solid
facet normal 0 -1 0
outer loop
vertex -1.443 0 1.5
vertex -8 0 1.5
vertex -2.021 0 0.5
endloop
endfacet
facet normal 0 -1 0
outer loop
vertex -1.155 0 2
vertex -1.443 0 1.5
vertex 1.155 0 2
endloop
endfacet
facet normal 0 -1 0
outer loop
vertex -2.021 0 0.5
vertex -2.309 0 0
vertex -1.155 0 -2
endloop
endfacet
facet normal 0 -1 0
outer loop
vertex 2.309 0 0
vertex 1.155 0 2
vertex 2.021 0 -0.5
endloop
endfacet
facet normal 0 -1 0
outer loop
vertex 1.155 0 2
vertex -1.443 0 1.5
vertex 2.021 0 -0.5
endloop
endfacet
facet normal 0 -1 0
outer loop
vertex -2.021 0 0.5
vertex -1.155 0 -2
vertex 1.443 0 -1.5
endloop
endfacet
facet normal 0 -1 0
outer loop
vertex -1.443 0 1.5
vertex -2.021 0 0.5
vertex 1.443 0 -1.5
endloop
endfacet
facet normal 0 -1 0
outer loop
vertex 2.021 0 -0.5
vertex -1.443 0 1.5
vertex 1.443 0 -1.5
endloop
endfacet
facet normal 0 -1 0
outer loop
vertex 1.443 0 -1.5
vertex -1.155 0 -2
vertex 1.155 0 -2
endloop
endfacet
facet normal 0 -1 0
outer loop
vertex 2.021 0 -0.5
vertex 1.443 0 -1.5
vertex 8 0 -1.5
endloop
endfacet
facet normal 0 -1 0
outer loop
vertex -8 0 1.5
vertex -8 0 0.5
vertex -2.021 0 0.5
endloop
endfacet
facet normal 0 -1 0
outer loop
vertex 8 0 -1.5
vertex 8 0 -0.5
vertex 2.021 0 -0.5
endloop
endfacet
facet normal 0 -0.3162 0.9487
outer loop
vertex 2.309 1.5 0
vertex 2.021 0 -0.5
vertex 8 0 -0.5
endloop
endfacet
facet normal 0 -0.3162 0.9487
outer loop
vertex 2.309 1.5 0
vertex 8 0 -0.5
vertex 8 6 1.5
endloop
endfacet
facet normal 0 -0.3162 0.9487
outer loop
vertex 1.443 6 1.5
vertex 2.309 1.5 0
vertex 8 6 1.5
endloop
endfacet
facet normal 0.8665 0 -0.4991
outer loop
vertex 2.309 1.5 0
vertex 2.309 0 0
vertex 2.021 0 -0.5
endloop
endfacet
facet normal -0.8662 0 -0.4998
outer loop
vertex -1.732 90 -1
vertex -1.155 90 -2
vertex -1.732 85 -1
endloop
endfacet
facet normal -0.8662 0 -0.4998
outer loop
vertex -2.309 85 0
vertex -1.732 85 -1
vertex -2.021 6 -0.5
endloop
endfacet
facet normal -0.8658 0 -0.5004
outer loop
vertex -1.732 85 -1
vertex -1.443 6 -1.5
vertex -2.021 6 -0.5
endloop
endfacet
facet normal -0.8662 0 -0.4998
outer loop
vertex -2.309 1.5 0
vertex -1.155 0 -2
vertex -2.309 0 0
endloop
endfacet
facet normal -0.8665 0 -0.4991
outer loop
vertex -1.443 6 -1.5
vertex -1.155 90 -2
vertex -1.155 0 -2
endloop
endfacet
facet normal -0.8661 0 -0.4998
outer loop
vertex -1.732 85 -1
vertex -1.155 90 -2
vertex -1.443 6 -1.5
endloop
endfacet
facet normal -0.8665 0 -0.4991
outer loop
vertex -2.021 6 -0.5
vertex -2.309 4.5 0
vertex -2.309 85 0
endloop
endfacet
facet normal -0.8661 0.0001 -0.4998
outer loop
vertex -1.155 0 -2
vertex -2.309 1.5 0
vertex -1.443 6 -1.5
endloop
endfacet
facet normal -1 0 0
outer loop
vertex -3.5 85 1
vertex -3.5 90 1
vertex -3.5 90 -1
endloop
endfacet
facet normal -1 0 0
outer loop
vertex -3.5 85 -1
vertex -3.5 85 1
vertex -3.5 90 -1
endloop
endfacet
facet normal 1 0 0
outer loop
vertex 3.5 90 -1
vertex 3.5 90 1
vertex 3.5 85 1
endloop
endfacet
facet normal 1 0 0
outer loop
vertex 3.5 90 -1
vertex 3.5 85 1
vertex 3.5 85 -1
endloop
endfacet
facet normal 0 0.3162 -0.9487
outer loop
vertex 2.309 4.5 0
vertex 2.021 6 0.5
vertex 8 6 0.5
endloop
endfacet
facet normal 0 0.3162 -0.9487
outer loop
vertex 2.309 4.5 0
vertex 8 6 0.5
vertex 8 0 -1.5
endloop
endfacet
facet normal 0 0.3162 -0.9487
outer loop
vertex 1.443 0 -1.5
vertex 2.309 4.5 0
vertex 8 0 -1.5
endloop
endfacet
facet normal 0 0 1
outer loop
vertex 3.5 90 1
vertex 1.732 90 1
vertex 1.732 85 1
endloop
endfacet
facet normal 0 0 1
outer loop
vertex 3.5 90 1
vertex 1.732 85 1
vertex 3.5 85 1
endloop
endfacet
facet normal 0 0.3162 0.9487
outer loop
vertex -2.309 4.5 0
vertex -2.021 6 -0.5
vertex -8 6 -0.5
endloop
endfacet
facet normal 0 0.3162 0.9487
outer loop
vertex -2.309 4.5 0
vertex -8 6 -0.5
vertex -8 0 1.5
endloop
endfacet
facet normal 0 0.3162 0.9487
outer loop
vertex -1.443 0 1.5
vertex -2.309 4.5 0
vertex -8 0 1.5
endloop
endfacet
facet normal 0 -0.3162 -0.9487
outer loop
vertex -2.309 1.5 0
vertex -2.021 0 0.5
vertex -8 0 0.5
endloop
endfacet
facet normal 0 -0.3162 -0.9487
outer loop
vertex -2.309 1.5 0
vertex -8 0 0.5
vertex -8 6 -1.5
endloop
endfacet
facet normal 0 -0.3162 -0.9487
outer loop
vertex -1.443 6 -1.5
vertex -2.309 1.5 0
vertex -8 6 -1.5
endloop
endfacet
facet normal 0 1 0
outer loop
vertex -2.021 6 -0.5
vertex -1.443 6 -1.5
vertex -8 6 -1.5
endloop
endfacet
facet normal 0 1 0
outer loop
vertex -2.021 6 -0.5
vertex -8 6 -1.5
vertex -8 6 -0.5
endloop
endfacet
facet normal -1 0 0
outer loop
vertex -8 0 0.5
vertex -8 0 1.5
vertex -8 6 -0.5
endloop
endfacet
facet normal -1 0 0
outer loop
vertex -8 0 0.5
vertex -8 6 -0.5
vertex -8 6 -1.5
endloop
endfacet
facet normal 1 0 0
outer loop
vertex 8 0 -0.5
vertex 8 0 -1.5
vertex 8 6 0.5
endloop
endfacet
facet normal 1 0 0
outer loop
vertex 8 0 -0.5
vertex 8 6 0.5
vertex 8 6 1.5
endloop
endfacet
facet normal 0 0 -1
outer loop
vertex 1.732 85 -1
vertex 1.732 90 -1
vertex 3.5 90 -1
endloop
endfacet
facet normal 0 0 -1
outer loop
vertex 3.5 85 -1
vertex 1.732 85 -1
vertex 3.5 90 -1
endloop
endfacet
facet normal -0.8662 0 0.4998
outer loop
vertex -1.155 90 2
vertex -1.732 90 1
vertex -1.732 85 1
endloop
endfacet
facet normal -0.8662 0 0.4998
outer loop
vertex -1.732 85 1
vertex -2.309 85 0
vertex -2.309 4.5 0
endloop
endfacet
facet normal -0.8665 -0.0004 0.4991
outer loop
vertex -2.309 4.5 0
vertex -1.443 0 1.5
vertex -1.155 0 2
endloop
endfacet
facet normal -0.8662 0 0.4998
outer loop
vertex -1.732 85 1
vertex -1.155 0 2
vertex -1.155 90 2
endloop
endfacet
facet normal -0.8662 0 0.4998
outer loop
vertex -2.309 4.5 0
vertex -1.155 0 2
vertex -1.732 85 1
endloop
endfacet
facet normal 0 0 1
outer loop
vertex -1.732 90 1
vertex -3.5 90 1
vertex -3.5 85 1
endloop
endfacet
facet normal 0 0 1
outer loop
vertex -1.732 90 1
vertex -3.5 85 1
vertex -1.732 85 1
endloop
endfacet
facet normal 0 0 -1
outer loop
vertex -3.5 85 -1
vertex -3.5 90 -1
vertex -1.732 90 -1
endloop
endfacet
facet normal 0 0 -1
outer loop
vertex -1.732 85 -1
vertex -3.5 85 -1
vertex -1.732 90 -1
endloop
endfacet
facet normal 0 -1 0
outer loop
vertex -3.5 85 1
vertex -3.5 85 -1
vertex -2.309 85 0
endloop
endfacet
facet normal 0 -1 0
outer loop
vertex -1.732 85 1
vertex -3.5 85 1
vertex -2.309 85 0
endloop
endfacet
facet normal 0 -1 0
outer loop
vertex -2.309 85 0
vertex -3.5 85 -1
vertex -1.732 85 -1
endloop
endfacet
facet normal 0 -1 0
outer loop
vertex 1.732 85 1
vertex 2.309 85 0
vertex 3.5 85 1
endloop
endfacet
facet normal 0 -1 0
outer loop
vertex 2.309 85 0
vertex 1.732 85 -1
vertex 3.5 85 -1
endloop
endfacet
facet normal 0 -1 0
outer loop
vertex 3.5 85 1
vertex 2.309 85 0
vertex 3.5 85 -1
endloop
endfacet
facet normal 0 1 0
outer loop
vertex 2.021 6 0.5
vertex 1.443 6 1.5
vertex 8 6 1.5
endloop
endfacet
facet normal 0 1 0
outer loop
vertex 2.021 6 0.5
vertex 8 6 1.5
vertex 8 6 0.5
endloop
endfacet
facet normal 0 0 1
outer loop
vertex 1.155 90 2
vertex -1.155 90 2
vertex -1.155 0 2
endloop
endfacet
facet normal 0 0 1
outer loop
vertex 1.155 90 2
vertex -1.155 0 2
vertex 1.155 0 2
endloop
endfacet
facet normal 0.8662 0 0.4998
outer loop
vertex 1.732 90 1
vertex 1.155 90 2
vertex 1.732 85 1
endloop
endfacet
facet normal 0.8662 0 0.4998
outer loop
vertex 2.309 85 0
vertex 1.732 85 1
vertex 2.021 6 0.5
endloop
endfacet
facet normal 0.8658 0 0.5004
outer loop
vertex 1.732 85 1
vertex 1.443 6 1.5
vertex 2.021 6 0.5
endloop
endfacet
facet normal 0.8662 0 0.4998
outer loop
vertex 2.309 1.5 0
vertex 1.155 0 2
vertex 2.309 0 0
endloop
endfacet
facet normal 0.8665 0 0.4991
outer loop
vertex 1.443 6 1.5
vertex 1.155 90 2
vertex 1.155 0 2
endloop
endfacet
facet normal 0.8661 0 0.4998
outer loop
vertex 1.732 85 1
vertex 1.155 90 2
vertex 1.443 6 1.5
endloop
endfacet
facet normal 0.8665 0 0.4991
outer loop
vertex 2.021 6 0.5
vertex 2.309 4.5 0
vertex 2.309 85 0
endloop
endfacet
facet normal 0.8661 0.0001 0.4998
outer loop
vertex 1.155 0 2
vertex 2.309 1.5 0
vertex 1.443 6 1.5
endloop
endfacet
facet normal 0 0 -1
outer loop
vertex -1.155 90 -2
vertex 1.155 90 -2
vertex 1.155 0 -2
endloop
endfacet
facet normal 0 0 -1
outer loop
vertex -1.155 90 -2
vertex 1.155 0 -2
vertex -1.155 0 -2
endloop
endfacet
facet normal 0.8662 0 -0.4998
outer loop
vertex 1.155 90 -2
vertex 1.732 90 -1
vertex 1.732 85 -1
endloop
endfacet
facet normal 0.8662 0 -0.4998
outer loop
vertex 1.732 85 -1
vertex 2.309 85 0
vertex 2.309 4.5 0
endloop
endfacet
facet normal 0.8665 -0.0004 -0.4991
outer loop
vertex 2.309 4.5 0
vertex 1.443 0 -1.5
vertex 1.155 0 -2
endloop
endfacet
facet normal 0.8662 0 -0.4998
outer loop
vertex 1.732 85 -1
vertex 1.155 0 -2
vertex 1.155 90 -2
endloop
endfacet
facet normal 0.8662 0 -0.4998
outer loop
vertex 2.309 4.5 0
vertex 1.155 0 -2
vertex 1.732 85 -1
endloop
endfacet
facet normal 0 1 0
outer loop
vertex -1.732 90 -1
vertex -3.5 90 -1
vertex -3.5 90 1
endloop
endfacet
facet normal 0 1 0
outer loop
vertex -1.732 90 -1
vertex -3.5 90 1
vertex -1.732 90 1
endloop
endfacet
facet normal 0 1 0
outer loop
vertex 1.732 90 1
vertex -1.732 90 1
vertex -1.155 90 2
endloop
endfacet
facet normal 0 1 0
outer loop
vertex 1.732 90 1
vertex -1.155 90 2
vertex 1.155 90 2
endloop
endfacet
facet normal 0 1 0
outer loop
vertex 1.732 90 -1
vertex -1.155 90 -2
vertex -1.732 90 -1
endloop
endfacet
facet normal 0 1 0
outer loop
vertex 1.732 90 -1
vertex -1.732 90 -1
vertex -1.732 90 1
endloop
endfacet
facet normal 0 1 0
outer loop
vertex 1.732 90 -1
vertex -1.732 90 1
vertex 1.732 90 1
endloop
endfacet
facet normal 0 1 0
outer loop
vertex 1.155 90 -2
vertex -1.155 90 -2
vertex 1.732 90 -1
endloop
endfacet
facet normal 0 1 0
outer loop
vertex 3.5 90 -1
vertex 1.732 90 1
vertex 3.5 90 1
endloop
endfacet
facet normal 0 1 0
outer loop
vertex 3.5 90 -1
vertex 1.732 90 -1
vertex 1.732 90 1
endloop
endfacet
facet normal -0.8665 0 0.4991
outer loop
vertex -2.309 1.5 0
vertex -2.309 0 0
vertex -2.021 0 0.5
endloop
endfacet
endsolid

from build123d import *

# Parameters (mm, degrees)
BOSS_EXTRUDE1_DEPTH = 90
SKETCH2_W           = 7
SKETCH2_H           = 2
BOSS_EXTRUDE2_DEPTH = 5
BOSS_EXTRUDE3_DEPTH = 8
BOSS_EXTRUDE4_DEPTH = 8


with BuildPart() as part:
    # Sketch1 → Boss-Extrude1 (new body)
    with BuildSketch(Plane(origin=(0, 0, 0), x_dir=(1, 0, 0), z_dir=(0, 1, 0))):
        Polygon((-1.154700538, 2), (-2.309401077, 0), (-1.154700538, -2), (1.154700538, -2), (2.309401077, 0), (1.154700538, 2), align=None)
    extrude(amount=BOSS_EXTRUDE1_DEPTH)

    # Sketch2 → Boss-Extrude2 (add)
    with BuildSketch(Plane(origin=(0, 90, 0), x_dir=(1, 0, 0), z_dir=(0, 1, 0))):
        Rectangle(SKETCH2_W, SKETCH2_H)
    extrude(amount=-BOSS_EXTRUDE2_DEPTH)

    # Sketch3 → Boss-Extrude3 (add)
    with BuildSketch(Plane(origin=(0, 0, 0), x_dir=(0, 0, -1), z_dir=(1, 0, 0))):
        Polygon((-1.5, 6), (-0.5, 6), (1.5, 0), (0.5, 0), align=None)
    extrude(amount=BOSS_EXTRUDE3_DEPTH)

    # Sketch4 → Boss-Extrude4 (add)
    with BuildSketch(Plane(origin=(0, 0, 0), x_dir=(0, 0, -1), z_dir=(1, 0, 0))):
        Polygon((1.5, 6), (0.5, 6), (-1.5, 0), (-0.5, 0), align=None)
    extrude(amount=-BOSS_EXTRUDE4_DEPTH)


solid = part.part
